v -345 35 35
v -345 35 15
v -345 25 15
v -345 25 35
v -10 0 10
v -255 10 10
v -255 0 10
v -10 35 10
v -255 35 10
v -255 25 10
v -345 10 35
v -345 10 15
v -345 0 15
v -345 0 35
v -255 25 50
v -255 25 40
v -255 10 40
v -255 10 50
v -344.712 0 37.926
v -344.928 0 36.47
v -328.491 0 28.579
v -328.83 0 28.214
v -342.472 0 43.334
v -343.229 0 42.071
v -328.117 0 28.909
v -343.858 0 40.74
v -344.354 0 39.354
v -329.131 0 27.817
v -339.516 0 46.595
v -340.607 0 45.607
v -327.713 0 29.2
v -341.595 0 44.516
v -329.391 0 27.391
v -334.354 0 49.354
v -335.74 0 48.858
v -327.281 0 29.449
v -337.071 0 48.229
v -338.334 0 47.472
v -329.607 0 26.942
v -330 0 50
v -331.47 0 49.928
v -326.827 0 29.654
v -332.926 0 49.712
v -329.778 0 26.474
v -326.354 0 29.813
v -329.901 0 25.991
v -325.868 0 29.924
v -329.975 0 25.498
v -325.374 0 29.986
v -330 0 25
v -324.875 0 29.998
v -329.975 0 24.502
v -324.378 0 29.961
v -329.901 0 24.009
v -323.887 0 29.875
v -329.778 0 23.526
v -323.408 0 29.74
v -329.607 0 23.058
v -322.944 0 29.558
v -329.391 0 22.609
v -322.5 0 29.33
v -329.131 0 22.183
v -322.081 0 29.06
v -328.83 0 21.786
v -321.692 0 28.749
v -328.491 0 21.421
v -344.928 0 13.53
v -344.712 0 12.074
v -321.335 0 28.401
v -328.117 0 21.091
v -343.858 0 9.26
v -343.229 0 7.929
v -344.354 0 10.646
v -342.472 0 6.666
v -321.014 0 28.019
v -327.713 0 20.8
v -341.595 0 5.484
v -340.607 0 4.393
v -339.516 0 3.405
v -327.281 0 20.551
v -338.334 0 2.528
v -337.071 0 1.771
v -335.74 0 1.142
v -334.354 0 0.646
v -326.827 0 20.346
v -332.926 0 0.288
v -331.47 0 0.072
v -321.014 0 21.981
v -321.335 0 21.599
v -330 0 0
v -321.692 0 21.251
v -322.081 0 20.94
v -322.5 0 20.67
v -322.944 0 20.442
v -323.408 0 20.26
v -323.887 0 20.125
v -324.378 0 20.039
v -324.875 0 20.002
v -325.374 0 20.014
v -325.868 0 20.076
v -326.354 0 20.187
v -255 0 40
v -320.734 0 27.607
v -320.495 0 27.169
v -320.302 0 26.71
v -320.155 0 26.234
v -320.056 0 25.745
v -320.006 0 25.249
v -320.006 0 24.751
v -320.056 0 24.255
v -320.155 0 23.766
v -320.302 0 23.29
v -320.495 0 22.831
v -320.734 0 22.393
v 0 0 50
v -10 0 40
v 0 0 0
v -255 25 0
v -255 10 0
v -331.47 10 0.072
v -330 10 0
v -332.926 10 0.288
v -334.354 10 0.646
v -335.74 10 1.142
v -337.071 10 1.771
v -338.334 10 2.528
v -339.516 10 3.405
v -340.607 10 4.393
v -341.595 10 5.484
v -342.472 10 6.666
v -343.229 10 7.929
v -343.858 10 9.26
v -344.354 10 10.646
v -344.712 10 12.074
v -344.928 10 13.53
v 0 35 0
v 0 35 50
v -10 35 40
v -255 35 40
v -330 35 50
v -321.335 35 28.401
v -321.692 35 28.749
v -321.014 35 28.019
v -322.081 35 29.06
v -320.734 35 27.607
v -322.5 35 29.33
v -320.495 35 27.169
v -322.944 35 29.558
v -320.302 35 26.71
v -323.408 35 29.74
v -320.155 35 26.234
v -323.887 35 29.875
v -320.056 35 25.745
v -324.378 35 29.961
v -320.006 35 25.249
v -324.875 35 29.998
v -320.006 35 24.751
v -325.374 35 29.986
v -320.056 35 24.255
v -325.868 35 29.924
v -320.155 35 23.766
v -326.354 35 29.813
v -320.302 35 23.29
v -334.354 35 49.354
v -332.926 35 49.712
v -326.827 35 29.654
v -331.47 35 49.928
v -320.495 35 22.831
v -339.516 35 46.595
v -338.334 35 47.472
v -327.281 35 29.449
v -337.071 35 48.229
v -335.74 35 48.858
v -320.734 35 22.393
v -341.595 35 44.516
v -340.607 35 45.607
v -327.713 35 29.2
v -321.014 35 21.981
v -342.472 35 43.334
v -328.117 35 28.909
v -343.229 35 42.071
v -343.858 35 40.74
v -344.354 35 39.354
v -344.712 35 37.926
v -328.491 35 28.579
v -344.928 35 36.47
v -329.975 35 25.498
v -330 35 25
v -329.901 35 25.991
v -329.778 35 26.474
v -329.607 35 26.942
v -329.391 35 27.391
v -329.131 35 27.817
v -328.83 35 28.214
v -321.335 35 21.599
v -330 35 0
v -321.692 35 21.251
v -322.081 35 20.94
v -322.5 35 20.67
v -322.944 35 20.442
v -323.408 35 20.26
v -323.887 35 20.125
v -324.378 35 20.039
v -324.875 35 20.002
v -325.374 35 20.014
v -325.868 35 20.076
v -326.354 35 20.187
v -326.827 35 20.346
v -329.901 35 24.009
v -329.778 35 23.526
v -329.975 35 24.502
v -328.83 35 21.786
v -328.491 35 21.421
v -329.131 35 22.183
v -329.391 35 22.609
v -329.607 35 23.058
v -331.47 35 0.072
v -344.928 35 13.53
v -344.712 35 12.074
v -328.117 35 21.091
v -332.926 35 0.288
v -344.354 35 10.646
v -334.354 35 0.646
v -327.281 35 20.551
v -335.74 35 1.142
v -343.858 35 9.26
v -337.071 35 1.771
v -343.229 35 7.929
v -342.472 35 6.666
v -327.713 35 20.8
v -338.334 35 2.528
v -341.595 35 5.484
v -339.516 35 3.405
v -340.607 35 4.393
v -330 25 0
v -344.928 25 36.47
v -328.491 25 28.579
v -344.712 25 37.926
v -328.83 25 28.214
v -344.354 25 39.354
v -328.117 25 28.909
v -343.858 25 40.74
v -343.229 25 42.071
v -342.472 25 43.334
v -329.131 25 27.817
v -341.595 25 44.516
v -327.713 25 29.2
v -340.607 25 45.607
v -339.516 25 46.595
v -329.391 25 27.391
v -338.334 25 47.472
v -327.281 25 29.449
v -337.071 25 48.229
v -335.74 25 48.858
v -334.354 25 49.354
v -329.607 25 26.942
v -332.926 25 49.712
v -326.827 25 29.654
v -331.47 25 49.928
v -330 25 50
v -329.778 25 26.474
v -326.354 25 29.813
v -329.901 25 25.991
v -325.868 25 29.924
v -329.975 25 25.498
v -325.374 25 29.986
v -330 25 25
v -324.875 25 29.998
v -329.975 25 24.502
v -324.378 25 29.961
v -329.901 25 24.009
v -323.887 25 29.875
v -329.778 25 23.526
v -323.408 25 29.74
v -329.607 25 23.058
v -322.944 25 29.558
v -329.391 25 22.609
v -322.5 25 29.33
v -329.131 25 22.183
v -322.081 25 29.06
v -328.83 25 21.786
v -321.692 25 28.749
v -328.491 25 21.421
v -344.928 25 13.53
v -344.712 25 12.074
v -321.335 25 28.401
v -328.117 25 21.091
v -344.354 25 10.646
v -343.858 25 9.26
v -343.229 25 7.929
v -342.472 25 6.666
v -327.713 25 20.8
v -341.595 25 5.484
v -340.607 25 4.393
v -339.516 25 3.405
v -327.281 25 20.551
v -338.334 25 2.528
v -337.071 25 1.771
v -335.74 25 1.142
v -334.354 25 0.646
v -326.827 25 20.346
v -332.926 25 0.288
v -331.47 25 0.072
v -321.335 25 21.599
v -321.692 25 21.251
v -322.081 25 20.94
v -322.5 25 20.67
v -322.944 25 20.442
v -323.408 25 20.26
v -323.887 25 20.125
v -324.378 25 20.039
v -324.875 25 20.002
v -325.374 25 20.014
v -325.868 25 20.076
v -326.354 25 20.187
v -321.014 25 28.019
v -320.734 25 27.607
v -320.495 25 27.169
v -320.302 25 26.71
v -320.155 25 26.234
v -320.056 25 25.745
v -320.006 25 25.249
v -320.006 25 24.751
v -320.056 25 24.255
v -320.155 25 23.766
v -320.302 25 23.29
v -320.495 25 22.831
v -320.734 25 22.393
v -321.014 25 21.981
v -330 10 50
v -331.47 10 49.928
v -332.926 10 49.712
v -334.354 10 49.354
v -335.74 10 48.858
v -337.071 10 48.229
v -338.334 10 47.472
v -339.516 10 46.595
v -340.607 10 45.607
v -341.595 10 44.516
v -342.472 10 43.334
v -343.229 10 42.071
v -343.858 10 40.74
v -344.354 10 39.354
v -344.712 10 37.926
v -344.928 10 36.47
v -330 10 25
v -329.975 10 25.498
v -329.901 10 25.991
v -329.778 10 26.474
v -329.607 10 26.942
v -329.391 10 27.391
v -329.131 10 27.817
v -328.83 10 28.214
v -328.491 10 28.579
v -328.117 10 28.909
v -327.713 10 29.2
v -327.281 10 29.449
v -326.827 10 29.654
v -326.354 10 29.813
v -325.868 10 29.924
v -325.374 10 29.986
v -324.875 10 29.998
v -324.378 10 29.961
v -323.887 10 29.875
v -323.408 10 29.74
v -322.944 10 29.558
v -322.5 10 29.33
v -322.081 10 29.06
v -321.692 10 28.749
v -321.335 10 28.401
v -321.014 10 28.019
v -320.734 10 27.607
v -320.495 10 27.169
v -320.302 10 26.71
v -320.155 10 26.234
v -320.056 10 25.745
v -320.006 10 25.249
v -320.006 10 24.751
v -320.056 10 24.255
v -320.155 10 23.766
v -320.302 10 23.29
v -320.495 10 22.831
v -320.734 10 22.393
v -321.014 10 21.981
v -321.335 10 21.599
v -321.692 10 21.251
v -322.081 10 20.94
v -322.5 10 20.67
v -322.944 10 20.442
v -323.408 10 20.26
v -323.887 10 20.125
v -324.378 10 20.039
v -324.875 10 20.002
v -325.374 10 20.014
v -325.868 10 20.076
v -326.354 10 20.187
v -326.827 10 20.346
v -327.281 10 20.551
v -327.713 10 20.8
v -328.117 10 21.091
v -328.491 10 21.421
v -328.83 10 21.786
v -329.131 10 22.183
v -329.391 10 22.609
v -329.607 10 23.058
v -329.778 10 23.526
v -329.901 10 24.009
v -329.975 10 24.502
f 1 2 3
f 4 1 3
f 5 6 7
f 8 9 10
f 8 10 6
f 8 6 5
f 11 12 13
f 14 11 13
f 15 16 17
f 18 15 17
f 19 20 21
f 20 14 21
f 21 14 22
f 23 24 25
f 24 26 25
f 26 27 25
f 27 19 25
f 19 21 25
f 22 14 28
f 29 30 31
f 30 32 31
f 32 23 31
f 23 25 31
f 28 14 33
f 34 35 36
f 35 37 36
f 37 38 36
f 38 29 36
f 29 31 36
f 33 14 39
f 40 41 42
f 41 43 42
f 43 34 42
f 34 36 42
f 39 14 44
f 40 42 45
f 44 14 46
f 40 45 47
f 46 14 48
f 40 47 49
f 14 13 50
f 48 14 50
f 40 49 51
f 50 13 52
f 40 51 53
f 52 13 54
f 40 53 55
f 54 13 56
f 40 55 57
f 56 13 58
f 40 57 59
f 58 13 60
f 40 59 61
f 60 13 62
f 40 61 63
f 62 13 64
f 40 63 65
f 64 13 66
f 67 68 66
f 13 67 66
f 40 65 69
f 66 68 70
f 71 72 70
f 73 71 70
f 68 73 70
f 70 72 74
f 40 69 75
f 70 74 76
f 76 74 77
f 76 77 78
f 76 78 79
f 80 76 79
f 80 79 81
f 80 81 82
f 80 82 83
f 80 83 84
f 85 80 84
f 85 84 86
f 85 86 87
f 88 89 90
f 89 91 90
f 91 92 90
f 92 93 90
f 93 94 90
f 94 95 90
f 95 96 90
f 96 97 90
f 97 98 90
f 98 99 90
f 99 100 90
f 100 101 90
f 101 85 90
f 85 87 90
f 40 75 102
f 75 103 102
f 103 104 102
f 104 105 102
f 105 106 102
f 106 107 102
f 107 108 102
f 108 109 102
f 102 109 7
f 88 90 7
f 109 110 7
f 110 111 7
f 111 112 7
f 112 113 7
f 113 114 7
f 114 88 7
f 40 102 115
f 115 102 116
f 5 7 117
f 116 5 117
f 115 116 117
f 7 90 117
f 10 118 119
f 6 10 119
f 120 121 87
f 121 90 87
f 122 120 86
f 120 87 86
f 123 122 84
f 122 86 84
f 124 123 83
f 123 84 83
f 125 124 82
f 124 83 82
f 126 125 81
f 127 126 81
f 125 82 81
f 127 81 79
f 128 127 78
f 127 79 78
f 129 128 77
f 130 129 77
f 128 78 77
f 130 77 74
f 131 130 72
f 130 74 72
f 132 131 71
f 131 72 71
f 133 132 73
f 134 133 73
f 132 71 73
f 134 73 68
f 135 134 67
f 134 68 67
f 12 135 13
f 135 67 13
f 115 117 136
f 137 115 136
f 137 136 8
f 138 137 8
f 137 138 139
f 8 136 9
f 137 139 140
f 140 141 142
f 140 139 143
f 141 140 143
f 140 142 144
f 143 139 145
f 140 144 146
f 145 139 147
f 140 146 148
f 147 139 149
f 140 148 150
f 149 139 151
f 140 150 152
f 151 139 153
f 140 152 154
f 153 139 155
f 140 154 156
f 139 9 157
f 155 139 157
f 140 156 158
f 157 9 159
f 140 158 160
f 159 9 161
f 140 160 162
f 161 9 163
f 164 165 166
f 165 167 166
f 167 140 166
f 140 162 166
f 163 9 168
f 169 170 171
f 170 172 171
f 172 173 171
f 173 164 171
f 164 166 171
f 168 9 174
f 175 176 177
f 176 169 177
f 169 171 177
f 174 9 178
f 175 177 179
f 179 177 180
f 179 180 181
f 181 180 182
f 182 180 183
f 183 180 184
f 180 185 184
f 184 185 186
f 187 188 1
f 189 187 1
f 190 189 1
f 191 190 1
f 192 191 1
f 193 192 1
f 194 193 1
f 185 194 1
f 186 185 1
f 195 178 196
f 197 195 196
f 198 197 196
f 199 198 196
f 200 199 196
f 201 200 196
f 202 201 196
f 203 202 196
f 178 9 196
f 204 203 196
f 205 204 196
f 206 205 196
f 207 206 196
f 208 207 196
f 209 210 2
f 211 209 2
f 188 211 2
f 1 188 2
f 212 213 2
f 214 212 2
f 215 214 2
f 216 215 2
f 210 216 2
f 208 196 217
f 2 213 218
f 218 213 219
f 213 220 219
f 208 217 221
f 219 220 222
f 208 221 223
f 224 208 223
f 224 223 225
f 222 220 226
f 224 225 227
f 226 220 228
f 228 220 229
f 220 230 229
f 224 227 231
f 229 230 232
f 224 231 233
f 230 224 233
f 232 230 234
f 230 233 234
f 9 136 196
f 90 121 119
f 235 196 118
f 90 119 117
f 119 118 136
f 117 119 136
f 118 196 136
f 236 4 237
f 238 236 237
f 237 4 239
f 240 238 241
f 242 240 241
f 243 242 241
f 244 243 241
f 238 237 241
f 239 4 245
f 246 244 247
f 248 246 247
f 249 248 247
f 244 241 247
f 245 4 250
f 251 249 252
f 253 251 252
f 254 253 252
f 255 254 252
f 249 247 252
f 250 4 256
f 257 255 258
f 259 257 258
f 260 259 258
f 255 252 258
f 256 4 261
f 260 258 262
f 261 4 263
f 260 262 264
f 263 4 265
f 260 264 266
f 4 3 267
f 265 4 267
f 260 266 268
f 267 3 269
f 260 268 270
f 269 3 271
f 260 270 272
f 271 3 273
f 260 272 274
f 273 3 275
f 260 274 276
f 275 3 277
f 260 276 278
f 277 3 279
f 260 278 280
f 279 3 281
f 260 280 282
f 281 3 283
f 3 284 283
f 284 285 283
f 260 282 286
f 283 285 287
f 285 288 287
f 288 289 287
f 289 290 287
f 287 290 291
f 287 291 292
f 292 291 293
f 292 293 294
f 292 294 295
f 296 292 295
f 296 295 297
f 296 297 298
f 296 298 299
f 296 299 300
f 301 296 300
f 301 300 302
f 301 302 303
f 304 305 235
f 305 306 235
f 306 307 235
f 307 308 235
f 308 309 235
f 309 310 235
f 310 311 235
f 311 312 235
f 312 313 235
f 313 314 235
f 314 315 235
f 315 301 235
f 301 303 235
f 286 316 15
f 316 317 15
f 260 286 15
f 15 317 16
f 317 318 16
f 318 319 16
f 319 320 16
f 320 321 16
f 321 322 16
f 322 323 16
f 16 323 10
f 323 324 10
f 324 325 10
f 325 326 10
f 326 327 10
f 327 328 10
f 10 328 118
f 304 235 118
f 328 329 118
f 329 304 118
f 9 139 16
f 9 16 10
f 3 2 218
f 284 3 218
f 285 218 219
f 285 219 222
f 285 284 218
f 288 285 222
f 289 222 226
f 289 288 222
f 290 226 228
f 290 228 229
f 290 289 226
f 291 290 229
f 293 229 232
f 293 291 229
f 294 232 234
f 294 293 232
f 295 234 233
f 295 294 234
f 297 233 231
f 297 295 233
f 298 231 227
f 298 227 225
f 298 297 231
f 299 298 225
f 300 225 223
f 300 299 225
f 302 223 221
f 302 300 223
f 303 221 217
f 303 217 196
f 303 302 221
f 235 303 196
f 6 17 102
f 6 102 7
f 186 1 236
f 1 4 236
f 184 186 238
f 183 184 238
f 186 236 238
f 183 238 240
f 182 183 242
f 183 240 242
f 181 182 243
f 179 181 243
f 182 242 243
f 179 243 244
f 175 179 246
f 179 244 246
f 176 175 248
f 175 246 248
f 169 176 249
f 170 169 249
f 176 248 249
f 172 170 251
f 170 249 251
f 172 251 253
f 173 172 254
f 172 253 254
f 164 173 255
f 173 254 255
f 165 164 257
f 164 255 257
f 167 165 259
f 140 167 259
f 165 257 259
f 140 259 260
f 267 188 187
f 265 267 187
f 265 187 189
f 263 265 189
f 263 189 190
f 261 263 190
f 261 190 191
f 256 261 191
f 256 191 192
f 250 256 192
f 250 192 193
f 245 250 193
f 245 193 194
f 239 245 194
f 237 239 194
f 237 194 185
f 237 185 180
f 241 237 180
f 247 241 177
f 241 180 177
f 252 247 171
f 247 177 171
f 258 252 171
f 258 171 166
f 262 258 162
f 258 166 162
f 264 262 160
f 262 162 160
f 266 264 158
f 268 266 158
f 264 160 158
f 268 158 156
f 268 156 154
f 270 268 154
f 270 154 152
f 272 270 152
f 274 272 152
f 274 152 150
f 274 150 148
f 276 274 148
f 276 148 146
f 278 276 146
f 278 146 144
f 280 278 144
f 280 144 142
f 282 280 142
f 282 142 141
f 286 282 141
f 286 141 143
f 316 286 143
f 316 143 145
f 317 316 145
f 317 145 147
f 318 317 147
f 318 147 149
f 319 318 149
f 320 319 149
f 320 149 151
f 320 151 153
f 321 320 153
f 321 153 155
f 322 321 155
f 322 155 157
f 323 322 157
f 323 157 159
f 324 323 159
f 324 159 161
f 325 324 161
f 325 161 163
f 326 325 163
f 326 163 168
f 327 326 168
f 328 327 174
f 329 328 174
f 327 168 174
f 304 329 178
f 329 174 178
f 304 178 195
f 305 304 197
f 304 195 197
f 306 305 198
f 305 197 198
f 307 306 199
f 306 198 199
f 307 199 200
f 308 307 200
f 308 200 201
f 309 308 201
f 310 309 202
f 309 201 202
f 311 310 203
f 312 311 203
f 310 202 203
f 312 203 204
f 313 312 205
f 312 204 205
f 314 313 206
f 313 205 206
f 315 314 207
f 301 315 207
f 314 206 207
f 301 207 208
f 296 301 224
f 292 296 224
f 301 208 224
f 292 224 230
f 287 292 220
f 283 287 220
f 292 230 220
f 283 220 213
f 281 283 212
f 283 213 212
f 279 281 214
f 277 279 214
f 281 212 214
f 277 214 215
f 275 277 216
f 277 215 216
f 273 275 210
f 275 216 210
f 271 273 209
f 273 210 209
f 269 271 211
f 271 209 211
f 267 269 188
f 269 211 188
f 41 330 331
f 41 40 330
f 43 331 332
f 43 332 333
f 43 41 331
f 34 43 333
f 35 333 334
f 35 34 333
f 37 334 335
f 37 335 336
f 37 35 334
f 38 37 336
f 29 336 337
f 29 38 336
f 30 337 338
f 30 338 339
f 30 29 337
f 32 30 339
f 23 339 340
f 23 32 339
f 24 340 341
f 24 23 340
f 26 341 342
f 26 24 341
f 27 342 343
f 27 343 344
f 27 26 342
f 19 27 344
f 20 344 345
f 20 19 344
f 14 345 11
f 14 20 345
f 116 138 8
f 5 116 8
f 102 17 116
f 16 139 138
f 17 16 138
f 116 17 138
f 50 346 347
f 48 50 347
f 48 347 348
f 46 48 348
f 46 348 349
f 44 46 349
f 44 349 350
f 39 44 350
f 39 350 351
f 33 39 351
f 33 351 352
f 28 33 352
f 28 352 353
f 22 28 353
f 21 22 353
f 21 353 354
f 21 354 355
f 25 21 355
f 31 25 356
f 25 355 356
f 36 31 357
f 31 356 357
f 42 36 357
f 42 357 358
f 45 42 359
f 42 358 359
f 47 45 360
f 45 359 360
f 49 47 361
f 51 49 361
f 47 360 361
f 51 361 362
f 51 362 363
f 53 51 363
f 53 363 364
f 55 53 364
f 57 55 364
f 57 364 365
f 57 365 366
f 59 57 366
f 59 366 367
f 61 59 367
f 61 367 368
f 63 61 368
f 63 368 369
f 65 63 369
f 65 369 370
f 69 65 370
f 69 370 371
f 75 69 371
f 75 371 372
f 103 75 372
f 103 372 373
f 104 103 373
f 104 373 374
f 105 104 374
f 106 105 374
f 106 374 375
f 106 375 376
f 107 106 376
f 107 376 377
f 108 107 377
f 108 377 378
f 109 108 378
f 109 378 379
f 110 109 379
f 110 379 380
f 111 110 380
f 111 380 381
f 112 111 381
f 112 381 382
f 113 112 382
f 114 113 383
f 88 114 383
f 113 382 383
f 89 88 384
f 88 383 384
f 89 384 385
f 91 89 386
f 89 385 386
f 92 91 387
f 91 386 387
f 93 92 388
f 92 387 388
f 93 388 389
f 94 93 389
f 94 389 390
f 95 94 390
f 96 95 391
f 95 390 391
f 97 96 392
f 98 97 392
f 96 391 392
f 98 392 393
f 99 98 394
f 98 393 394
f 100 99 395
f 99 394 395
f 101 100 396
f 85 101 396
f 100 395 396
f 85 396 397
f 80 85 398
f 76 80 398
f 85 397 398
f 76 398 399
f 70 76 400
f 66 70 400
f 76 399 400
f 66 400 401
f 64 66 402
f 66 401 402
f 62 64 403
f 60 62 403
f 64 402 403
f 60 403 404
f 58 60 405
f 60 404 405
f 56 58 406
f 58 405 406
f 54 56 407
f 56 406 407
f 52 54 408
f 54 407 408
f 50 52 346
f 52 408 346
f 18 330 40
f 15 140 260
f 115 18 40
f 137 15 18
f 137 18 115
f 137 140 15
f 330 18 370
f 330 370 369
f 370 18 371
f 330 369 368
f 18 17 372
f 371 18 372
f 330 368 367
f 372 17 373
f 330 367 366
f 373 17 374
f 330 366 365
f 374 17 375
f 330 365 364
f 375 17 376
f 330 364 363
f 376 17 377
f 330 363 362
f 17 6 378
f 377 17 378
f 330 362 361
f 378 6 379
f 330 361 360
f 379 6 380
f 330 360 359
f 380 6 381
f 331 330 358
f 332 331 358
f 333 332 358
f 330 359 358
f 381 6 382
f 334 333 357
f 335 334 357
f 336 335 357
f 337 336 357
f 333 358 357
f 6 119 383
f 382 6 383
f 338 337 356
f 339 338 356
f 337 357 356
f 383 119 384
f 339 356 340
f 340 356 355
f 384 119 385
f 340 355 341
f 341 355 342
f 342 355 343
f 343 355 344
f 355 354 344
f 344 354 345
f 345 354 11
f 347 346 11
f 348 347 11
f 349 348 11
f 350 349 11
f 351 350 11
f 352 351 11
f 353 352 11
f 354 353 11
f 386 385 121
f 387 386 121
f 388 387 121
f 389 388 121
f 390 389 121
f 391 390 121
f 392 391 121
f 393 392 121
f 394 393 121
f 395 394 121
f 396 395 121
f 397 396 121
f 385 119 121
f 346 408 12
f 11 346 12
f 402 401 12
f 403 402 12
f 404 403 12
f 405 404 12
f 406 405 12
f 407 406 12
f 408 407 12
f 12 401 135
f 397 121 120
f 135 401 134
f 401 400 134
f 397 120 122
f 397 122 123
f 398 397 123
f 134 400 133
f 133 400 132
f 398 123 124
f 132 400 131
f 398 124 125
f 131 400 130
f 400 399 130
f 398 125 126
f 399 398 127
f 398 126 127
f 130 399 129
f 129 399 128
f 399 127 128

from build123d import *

# Parameters (mm, degrees)
BOSS_EXTRUDE1_DEPTH = 50
SKETCH2_R           = 5
SKETCH2_W           = 245
SKETCH2_H           = 30
CUT_EXTRUDE1_DEPTH  = 351.356960827
FILLET1_R           = 15


with BuildPart() as part:
    # Sketch1 → Boss-Extrude1 (new body)
    with BuildSketch(Plane.XY):
        Polygon((-345, 25), (-255, 25), (-255, 10), (-345, 10), (-345, 0), (0, 0), (0, 35), (-345, 35), align=None)
    extrude(amount=BOSS_EXTRUDE1_DEPTH)

    # Sketch2 → Cut-Extrude1 (cut, through all)
    with BuildSketch(Plane(origin=(0, 35, 0), x_dir=(1, 0, 0), z_dir=(0, 1, 0))):
        with Locations(Location((-325, -25, 0), (0, 0, 180))):
            Circle(SKETCH2_R)
        with Locations((-132.5, -25)):
            Rectangle(SKETCH2_W, SKETCH2_H)
    extrude(amount=-CUT_EXTRUDE1_DEPTH, mode=Mode.SUBTRACT)

    # Fillet1
    fillet1_edges = [part.edges().sort_by_distance(p)[0] for p in [
        (-345, 30, 0),
        (-345, 30, 50),
        (-345, 5, 50),
        (-345, 5, 0),
    ]]
    fillet(fillet1_edges, radius=FILLET1_R)


solid = part.part
